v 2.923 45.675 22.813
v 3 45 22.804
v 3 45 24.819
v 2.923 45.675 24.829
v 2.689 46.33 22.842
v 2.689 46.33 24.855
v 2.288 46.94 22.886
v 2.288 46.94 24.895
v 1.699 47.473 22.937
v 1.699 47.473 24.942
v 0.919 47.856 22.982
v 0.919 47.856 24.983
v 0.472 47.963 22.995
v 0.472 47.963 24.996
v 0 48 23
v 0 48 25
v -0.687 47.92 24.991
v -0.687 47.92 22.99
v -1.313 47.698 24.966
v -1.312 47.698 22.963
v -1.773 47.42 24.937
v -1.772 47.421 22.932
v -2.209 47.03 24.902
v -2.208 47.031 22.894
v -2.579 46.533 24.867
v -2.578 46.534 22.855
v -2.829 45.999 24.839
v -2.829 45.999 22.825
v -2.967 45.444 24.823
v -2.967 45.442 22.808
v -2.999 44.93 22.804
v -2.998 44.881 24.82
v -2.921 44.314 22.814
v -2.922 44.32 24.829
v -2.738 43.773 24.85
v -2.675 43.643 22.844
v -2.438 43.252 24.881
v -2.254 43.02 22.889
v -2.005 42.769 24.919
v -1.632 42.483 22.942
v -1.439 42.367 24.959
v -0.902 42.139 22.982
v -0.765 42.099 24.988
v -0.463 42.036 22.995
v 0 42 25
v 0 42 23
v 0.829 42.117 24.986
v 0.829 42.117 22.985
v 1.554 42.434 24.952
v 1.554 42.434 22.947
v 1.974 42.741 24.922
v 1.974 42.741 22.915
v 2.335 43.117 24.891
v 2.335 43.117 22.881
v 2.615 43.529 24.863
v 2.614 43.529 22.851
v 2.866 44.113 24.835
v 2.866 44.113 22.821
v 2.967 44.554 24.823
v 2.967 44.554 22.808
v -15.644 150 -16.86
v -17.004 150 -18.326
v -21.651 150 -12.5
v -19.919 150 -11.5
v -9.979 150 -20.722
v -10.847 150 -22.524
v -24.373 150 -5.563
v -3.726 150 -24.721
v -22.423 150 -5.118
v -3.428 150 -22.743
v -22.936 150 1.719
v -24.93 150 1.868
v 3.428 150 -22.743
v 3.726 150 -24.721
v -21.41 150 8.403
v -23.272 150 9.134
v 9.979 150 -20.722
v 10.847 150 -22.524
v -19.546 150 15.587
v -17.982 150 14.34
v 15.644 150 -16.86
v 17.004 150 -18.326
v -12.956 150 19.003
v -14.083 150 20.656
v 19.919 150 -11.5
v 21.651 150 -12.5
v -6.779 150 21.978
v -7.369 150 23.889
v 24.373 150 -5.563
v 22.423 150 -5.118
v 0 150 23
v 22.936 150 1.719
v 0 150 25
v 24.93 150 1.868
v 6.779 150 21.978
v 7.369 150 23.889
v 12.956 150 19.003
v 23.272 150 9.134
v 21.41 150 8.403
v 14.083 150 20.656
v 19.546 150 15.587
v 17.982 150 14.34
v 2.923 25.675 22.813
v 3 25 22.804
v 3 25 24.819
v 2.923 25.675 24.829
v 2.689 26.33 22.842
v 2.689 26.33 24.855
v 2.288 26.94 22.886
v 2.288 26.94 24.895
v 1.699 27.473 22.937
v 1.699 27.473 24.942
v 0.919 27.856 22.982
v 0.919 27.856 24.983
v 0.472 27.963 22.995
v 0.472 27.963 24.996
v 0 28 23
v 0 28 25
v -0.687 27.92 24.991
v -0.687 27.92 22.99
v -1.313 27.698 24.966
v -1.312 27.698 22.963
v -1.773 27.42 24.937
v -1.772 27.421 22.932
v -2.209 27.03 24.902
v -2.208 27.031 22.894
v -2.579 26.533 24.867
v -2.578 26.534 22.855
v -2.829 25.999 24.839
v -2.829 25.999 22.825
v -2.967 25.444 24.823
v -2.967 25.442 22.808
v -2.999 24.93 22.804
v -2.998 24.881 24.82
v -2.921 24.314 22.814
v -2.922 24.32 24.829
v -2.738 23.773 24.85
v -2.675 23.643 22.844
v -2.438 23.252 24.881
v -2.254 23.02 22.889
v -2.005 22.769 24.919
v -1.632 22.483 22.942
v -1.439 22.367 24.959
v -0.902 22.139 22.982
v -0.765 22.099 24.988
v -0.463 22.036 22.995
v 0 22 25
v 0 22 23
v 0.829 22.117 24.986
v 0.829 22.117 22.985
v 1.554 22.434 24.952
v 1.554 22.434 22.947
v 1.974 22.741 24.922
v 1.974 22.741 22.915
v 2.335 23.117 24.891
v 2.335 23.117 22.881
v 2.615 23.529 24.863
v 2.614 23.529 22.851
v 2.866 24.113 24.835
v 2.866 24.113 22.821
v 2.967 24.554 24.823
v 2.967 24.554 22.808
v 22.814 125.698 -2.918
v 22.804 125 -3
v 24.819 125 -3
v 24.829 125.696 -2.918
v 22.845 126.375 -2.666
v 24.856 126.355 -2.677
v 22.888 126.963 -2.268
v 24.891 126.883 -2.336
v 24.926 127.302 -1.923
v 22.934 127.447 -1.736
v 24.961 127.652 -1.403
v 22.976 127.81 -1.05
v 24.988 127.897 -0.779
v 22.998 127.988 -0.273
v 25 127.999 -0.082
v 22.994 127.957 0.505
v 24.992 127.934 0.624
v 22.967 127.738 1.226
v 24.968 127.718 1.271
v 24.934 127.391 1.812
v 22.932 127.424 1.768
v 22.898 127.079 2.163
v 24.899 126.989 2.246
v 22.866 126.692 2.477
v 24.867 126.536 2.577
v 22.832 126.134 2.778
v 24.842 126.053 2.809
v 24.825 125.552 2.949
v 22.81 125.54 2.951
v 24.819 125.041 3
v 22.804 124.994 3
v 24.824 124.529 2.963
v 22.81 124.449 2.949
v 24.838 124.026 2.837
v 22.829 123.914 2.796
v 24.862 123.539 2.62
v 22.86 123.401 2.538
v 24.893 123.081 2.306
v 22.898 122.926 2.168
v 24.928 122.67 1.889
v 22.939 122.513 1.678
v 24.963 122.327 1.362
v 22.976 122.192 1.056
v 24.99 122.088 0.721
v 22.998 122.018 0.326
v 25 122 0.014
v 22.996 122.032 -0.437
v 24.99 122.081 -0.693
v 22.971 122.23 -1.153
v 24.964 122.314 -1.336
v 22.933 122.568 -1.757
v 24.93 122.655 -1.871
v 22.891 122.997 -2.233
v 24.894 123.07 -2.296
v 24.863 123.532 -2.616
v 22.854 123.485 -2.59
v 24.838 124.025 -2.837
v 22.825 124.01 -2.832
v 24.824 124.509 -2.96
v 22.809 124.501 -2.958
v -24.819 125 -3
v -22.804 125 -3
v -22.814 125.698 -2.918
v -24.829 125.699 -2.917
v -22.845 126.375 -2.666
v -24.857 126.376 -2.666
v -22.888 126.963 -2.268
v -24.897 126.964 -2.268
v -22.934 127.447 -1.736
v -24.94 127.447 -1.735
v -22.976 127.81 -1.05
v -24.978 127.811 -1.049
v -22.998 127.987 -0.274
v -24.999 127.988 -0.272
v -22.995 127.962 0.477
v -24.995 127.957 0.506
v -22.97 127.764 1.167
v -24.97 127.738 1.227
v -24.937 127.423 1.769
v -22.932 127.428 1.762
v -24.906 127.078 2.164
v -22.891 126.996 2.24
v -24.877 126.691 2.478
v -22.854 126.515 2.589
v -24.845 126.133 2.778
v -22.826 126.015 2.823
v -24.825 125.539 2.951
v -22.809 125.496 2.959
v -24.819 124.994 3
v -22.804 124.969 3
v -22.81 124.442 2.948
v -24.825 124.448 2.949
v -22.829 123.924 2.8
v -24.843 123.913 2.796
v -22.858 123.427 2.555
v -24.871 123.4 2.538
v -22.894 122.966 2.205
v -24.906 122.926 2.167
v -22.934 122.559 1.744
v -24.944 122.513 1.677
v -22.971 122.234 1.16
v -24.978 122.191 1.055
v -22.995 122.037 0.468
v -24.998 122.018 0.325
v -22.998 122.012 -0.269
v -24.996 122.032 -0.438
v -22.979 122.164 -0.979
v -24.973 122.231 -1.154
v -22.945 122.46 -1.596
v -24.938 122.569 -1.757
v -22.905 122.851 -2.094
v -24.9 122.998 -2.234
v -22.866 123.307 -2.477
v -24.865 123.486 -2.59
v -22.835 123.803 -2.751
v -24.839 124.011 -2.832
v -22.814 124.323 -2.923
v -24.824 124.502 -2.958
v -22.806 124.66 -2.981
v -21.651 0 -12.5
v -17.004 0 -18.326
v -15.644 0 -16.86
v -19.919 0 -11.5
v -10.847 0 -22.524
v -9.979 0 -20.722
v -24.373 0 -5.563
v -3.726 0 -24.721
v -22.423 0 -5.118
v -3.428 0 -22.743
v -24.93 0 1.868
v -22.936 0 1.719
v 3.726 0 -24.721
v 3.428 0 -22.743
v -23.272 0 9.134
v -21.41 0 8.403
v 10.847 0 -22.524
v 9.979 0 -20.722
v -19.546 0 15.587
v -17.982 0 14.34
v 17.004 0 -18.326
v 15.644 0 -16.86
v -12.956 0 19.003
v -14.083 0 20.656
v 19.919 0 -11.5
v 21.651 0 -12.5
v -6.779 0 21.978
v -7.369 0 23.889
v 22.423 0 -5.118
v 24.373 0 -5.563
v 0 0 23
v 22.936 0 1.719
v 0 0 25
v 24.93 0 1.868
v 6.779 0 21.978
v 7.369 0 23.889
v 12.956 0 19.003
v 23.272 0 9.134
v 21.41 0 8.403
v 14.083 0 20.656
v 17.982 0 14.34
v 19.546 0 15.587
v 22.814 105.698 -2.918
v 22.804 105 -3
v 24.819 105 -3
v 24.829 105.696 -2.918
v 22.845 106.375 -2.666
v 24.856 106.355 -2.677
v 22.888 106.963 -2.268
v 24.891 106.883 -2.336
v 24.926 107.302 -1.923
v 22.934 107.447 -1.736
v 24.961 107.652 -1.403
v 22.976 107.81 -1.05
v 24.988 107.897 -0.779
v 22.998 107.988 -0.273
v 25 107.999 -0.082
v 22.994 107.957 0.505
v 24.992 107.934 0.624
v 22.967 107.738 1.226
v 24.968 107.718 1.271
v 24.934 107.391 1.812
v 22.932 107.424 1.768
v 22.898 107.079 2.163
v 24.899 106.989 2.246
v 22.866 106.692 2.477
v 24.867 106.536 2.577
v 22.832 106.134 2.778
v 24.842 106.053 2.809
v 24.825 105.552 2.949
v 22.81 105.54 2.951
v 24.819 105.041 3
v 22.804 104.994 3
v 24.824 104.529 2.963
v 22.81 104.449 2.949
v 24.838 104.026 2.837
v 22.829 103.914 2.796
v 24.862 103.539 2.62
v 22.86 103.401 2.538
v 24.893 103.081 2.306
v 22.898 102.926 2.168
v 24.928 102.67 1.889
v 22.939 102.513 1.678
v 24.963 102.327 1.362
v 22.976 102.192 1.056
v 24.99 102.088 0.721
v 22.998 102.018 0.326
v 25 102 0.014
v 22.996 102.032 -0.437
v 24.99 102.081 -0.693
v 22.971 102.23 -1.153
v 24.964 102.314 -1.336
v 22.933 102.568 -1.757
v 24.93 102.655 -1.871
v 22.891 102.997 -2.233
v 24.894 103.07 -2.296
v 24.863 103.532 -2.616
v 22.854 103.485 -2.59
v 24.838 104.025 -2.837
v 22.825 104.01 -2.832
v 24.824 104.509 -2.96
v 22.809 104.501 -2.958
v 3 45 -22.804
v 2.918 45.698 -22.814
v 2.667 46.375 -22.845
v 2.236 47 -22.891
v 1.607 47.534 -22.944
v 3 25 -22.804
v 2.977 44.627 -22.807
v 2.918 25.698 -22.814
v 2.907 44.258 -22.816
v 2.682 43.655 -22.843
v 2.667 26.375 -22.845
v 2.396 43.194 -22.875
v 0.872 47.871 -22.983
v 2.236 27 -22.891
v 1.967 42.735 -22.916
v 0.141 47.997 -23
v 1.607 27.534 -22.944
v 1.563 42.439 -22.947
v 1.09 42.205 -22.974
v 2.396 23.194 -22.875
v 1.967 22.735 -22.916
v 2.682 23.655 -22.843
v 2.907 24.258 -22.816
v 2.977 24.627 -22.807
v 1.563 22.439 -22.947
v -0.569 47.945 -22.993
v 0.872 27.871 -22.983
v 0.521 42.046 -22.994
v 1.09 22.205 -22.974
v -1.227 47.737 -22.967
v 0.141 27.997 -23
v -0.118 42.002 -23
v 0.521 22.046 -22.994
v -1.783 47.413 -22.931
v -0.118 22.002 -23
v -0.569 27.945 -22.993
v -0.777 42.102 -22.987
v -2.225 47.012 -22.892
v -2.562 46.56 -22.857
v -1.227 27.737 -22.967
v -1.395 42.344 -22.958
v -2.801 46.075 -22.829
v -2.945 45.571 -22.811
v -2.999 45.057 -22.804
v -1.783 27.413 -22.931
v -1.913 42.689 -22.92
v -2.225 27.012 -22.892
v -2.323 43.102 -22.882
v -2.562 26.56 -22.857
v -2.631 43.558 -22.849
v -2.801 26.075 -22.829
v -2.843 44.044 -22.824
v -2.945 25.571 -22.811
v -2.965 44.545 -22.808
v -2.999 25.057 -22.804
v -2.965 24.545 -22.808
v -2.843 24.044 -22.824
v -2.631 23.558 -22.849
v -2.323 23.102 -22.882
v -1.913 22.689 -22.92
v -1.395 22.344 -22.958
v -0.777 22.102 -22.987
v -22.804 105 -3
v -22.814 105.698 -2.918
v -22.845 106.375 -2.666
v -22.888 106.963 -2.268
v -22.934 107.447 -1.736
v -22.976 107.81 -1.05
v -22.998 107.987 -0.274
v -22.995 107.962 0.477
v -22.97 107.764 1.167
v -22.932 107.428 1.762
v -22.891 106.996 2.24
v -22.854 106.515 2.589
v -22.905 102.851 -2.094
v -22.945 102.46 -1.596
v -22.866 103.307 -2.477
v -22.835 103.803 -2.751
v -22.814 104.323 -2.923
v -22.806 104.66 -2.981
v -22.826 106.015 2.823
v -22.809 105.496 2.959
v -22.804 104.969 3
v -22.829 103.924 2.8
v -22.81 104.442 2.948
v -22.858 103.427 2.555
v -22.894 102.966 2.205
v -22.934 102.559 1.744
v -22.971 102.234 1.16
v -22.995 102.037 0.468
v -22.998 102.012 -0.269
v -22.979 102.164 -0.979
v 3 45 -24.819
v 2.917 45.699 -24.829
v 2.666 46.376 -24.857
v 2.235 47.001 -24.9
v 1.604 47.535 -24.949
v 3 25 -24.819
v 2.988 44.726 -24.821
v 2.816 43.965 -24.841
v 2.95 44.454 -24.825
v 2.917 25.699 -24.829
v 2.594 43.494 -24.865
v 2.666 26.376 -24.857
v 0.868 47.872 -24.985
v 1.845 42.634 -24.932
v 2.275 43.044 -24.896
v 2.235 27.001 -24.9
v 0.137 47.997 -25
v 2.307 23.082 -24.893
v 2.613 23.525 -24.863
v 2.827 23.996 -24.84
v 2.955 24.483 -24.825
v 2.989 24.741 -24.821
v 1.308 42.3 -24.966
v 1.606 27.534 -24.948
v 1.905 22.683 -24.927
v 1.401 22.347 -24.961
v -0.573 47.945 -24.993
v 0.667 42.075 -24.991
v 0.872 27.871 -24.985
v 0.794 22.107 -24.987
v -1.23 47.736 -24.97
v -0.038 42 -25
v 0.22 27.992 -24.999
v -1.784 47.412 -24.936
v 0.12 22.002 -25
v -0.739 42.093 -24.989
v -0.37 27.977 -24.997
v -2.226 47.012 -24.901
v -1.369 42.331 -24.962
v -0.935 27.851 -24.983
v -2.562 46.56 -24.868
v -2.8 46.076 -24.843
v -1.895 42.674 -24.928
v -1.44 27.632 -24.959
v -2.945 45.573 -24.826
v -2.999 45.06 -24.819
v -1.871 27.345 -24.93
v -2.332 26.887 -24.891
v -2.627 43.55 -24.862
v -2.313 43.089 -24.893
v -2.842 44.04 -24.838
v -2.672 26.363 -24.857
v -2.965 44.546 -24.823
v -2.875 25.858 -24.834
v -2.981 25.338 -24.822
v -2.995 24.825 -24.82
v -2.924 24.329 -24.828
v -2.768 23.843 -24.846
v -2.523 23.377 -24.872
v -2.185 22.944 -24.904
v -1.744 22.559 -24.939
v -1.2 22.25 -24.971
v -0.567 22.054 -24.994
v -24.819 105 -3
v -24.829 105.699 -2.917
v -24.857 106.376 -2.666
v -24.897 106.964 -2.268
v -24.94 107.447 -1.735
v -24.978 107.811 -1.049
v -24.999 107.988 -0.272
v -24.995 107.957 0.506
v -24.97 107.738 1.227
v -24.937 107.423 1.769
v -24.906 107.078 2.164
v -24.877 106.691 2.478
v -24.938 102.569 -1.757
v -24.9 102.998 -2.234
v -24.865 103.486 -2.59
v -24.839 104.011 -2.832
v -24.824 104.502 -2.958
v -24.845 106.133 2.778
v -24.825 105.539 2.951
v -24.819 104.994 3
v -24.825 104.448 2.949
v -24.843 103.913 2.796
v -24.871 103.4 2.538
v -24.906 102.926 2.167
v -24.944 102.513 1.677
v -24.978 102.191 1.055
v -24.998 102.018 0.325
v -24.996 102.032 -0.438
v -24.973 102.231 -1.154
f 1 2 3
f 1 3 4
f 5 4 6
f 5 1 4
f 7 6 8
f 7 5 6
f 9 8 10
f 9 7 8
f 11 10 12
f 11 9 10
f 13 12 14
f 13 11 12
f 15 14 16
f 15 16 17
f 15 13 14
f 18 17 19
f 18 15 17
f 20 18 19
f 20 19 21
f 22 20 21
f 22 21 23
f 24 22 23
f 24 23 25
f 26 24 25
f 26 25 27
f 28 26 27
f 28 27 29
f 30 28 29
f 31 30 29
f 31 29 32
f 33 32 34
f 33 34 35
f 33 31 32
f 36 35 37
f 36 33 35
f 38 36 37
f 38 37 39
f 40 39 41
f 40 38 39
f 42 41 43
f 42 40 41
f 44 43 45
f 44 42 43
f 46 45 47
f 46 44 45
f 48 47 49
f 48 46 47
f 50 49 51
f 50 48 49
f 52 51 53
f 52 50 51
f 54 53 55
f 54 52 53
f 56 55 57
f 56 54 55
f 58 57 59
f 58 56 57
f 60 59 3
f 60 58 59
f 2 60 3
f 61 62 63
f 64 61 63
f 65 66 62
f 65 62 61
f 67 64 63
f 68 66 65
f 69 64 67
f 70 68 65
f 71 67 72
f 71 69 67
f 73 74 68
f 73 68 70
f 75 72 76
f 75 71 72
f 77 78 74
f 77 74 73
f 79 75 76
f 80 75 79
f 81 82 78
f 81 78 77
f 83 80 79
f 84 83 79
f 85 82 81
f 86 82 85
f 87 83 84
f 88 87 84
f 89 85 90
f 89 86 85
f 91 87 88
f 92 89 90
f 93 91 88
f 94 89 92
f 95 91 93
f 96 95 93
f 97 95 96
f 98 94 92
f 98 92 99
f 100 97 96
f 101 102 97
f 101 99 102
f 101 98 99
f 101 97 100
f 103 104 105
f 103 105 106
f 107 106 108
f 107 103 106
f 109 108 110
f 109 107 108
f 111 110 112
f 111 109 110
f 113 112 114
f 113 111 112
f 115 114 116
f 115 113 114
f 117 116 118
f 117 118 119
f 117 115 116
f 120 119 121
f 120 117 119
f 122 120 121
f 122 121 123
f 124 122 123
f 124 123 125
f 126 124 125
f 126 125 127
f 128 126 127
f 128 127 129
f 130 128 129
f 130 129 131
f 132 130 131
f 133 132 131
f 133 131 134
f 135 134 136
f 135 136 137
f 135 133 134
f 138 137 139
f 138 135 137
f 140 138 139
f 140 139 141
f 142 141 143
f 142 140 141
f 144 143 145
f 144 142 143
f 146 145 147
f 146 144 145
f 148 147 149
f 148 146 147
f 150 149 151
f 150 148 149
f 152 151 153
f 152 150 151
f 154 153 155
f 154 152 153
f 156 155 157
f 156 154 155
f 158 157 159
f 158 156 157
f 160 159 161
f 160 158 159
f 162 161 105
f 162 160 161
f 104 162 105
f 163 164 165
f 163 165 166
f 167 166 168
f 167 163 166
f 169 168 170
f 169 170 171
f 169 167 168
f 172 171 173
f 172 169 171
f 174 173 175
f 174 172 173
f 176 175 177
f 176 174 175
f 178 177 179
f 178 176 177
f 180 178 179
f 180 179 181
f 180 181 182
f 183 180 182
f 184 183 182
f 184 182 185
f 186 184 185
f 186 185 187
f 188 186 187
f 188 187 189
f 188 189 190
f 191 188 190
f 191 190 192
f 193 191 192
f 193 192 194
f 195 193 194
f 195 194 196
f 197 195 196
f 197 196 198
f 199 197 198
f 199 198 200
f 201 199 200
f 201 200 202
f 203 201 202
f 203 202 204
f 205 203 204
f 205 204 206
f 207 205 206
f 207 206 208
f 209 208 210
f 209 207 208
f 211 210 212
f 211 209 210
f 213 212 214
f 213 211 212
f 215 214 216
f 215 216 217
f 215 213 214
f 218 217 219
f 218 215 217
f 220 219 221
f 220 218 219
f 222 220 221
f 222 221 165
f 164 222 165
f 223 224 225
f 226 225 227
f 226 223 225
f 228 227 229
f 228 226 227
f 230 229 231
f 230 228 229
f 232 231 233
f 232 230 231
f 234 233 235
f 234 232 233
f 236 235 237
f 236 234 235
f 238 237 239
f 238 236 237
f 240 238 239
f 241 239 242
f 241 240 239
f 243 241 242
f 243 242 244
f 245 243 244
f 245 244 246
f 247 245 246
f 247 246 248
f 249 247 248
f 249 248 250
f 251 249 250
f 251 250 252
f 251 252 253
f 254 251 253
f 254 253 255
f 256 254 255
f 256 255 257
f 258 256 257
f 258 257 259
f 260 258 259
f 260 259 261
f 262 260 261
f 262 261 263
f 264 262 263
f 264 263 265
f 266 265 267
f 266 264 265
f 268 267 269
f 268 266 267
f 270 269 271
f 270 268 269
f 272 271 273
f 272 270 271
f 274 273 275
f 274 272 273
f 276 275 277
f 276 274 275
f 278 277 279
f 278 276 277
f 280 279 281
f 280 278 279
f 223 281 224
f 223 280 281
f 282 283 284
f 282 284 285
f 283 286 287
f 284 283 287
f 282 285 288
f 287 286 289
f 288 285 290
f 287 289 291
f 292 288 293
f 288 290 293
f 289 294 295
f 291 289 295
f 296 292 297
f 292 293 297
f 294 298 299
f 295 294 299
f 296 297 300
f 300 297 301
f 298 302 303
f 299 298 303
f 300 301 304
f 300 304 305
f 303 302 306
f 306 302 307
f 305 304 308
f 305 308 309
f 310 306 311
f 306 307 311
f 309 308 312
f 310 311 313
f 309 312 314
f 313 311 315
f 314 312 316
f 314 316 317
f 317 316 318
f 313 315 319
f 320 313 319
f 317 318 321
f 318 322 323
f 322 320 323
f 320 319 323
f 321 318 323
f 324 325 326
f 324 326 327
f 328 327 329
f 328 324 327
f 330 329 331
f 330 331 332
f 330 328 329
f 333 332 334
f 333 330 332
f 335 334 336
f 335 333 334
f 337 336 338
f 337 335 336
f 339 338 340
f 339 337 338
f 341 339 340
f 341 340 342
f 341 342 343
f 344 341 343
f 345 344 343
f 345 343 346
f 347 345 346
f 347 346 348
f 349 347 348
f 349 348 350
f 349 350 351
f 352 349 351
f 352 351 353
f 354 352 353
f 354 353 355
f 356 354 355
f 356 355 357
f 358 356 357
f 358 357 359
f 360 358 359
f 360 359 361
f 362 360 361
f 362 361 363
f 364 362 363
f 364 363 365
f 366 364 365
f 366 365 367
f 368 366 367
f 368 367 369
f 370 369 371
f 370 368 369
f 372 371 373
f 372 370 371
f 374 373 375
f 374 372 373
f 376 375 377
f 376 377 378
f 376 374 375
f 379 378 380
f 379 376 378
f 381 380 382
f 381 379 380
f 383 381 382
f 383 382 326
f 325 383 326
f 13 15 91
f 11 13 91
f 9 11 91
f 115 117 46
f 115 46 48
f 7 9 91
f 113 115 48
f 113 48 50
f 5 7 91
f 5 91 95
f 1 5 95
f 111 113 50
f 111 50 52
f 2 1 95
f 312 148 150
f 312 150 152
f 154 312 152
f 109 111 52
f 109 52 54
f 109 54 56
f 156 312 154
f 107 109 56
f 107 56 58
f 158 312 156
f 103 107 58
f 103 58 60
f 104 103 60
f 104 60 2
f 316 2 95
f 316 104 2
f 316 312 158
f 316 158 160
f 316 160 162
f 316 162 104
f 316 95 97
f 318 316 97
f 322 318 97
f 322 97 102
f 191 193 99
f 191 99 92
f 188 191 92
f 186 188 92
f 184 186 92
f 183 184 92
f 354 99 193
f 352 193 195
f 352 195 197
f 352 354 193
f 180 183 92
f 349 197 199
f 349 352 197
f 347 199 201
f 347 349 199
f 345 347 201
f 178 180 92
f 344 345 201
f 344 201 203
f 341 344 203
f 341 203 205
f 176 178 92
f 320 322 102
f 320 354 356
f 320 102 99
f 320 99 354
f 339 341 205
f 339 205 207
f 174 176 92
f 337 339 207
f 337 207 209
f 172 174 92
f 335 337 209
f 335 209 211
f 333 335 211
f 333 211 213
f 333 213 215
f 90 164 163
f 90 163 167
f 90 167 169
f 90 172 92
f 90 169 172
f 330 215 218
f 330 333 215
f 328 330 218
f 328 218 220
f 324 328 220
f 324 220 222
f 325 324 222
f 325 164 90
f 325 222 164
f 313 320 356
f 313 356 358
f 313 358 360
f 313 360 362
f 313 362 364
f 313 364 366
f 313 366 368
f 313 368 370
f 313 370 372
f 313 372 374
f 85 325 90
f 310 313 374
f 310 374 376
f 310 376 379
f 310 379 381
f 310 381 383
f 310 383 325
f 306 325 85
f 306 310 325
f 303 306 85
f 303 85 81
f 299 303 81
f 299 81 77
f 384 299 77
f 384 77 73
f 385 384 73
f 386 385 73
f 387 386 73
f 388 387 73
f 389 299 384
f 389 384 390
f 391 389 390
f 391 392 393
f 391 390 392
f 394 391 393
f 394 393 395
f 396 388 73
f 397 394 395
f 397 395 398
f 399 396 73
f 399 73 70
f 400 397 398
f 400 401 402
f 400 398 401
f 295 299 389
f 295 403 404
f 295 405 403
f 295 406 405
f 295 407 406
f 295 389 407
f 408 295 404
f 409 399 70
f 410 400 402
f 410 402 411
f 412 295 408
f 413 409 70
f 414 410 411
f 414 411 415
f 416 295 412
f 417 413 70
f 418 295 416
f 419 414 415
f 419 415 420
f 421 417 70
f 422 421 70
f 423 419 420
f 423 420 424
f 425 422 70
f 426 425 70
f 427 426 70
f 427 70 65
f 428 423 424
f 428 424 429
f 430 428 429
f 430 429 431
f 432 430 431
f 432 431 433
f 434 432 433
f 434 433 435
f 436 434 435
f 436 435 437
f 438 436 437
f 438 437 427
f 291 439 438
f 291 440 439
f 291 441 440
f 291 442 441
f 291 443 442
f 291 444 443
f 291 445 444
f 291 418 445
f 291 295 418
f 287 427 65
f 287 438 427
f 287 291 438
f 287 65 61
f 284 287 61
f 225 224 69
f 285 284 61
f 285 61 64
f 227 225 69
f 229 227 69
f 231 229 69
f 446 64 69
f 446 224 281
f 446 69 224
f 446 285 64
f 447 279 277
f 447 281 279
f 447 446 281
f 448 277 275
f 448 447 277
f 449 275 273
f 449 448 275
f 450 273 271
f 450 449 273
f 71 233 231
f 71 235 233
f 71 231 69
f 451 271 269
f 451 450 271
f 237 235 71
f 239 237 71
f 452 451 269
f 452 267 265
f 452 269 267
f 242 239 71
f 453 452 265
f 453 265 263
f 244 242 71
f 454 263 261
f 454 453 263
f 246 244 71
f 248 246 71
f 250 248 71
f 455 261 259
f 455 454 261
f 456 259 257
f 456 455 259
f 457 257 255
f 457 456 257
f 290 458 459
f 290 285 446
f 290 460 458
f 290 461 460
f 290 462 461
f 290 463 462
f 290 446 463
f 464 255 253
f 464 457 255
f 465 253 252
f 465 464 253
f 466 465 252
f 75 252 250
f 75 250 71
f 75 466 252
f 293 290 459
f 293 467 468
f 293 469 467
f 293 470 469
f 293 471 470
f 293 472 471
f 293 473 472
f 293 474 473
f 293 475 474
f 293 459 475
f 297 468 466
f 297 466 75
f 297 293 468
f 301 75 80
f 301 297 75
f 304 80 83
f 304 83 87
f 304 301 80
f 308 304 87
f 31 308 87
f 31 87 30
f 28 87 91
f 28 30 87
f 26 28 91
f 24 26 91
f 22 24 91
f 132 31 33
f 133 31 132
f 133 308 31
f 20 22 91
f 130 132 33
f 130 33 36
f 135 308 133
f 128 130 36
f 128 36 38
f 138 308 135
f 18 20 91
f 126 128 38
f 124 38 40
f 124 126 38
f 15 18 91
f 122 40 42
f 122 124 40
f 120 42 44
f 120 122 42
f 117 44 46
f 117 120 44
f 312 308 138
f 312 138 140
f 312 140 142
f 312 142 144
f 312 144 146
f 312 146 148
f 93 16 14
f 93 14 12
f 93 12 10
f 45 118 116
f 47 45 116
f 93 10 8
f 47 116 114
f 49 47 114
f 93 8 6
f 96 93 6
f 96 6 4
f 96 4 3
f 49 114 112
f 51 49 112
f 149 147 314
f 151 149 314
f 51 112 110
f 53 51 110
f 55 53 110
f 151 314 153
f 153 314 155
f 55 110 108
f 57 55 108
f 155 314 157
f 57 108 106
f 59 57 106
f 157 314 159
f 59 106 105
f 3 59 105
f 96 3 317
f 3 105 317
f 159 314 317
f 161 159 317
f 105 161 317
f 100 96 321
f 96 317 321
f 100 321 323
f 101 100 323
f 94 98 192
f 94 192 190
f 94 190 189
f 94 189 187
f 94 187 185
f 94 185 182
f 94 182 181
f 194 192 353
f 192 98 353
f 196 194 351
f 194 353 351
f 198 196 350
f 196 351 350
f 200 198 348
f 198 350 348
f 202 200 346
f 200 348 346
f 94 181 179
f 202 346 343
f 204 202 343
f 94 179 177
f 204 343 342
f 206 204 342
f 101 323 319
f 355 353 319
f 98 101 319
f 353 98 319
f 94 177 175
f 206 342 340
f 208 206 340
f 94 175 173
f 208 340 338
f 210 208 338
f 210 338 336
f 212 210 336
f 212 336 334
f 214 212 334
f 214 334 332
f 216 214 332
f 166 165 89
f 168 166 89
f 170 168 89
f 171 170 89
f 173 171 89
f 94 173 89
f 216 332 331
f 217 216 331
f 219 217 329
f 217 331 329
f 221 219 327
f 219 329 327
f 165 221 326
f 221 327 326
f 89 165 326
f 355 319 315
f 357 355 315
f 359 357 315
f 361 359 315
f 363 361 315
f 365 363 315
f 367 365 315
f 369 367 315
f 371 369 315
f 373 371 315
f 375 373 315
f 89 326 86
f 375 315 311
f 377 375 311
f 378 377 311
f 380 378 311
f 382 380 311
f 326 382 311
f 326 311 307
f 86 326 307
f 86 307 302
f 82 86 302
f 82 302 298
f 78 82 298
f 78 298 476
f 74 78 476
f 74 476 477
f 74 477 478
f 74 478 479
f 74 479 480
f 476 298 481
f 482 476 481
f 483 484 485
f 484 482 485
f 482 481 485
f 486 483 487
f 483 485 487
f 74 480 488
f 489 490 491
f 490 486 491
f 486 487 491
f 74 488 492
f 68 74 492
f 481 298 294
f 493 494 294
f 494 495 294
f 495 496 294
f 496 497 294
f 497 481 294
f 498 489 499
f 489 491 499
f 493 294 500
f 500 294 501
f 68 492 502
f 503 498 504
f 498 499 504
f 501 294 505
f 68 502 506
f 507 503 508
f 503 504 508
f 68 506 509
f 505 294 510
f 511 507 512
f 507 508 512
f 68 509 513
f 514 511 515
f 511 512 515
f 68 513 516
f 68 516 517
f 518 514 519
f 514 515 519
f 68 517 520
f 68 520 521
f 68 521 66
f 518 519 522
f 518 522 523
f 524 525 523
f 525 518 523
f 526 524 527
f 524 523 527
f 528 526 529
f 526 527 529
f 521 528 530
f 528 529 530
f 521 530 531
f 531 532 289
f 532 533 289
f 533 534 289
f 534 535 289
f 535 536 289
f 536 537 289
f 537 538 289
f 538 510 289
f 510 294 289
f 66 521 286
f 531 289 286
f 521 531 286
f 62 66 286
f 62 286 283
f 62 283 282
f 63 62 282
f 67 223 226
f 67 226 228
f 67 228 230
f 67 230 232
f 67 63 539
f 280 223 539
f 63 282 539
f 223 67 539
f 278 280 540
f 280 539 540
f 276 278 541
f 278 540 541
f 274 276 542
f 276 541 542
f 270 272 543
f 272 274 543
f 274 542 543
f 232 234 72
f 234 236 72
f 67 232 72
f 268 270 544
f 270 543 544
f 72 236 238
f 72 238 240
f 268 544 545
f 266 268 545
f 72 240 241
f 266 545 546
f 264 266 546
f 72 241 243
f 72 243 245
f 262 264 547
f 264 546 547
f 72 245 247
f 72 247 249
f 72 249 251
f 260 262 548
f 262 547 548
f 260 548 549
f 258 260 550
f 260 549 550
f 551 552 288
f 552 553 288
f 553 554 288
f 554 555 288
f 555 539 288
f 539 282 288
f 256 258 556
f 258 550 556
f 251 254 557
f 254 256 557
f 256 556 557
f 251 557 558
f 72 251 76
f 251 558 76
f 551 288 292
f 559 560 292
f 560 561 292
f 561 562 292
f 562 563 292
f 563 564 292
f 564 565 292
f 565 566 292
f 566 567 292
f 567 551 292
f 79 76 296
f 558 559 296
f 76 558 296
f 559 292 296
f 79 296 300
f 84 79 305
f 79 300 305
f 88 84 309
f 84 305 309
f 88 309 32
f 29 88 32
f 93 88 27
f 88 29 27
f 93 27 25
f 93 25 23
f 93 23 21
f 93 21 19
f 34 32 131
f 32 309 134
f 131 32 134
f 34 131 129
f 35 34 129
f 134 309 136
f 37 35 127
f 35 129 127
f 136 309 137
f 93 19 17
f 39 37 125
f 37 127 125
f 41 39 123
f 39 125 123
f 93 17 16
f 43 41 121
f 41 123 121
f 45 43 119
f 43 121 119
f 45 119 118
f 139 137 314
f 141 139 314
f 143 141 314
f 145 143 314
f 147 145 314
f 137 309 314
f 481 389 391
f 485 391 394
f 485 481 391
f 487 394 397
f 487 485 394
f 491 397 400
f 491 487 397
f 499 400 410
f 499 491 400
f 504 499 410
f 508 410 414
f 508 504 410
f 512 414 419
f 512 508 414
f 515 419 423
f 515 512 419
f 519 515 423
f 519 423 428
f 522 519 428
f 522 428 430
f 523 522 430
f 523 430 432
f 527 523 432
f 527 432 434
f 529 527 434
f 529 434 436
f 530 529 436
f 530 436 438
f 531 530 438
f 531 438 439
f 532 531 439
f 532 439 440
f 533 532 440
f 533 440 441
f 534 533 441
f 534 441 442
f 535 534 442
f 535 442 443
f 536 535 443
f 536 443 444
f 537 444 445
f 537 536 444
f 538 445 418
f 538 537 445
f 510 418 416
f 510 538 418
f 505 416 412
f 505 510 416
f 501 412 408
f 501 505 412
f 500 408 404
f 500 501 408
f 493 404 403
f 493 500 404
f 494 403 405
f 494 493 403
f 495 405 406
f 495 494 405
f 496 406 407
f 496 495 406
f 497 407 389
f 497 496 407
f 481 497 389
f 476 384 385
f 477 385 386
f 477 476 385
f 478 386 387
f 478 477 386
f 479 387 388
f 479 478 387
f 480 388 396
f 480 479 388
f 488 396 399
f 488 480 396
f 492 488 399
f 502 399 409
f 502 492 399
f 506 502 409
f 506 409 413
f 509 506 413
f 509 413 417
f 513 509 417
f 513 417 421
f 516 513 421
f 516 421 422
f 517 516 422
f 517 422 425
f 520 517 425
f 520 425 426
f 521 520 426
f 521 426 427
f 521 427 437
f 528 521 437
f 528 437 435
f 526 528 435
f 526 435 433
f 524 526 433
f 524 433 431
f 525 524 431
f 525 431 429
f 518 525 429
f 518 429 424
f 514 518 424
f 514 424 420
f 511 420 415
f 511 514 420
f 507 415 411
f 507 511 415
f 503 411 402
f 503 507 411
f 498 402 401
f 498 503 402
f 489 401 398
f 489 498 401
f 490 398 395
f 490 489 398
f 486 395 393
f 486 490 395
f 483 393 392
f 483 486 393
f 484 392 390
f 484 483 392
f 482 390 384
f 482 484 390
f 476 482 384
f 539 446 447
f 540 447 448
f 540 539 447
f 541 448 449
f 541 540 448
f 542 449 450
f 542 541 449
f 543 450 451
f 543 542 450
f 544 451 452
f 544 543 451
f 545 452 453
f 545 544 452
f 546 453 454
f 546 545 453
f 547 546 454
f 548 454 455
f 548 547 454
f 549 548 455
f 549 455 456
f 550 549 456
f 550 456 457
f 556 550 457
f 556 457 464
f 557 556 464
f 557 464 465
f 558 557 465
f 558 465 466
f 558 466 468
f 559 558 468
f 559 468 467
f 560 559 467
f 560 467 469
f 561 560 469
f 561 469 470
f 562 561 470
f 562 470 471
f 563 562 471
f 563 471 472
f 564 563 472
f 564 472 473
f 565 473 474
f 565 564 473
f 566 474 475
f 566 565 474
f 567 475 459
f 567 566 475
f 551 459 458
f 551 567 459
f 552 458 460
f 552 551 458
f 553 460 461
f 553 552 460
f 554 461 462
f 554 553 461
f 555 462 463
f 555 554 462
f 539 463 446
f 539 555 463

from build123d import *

# Parameters (mm, degrees)
SKETCH_1_R               = 25
SKETCH_1_R_2             = 23
EXTRUDE_1_DEPTH          = 150
CUT_EXTRUDE_1_DEPTH      = 155.110350074
CUT_EXTRUDE_1_DEPTH_BACK = 155.110350074
SKETCH_2_R               = 3
CUT_EXTRUDE_2_DEPTH      = 155.110350204
CUT_EXTRUDE_2_DEPTH_BACK = 155.110350204
SKETCH_3_R               = 3


with BuildPart() as part:
    # 草图1 → 凸台-拉伸1 (new body)
    with BuildSketch(Plane(origin=(0, 0, 0), x_dir=(1, 0, 0), z_dir=(0, 1, 0))):
        with Locations(Location((0, 0, 0), (0, 0, 270))):
            Circle(SKETCH_1_R)
        with Locations(Location((0, 0, 0), (0, 0, 270))):
            Circle(SKETCH_1_R_2, mode=Mode.SUBTRACT)
    extrude(amount=EXTRUDE_1_DEPTH)

    # 草图2 → 切除-拉伸1 (cut, two sides: drawn at the far end of the back side and taken through both)
    with BuildSketch(Plane.XY.offset(-CUT_EXTRUDE_1_DEPTH_BACK)):
        with Locations((0, 45)):
            Circle(SKETCH_2_R)
        with Locations((0, 25)):
            Circle(SKETCH_2_R)
    extrude(amount=CUT_EXTRUDE_1_DEPTH + CUT_EXTRUDE_1_DEPTH_BACK, mode=Mode.SUBTRACT)

    # 草图3 → 切除-拉伸2 (cut, two sides: drawn at the far end of the back side and taken through both)
    with BuildSketch(Plane(origin=(0, 0, 0), x_dir=(0, 0, -1), z_dir=(1, 0, 0)).offset(-CUT_EXTRUDE_2_DEPTH_BACK)):
        with Locations((0, 125)):
            Circle(SKETCH_3_R)
        with Locations((0, 105)):
            Circle(SKETCH_3_R)
    extrude(amount=CUT_EXTRUDE_2_DEPTH + CUT_EXTRUDE_2_DEPTH_BACK, mode=Mode.SUBTRACT)


solid = part.part
